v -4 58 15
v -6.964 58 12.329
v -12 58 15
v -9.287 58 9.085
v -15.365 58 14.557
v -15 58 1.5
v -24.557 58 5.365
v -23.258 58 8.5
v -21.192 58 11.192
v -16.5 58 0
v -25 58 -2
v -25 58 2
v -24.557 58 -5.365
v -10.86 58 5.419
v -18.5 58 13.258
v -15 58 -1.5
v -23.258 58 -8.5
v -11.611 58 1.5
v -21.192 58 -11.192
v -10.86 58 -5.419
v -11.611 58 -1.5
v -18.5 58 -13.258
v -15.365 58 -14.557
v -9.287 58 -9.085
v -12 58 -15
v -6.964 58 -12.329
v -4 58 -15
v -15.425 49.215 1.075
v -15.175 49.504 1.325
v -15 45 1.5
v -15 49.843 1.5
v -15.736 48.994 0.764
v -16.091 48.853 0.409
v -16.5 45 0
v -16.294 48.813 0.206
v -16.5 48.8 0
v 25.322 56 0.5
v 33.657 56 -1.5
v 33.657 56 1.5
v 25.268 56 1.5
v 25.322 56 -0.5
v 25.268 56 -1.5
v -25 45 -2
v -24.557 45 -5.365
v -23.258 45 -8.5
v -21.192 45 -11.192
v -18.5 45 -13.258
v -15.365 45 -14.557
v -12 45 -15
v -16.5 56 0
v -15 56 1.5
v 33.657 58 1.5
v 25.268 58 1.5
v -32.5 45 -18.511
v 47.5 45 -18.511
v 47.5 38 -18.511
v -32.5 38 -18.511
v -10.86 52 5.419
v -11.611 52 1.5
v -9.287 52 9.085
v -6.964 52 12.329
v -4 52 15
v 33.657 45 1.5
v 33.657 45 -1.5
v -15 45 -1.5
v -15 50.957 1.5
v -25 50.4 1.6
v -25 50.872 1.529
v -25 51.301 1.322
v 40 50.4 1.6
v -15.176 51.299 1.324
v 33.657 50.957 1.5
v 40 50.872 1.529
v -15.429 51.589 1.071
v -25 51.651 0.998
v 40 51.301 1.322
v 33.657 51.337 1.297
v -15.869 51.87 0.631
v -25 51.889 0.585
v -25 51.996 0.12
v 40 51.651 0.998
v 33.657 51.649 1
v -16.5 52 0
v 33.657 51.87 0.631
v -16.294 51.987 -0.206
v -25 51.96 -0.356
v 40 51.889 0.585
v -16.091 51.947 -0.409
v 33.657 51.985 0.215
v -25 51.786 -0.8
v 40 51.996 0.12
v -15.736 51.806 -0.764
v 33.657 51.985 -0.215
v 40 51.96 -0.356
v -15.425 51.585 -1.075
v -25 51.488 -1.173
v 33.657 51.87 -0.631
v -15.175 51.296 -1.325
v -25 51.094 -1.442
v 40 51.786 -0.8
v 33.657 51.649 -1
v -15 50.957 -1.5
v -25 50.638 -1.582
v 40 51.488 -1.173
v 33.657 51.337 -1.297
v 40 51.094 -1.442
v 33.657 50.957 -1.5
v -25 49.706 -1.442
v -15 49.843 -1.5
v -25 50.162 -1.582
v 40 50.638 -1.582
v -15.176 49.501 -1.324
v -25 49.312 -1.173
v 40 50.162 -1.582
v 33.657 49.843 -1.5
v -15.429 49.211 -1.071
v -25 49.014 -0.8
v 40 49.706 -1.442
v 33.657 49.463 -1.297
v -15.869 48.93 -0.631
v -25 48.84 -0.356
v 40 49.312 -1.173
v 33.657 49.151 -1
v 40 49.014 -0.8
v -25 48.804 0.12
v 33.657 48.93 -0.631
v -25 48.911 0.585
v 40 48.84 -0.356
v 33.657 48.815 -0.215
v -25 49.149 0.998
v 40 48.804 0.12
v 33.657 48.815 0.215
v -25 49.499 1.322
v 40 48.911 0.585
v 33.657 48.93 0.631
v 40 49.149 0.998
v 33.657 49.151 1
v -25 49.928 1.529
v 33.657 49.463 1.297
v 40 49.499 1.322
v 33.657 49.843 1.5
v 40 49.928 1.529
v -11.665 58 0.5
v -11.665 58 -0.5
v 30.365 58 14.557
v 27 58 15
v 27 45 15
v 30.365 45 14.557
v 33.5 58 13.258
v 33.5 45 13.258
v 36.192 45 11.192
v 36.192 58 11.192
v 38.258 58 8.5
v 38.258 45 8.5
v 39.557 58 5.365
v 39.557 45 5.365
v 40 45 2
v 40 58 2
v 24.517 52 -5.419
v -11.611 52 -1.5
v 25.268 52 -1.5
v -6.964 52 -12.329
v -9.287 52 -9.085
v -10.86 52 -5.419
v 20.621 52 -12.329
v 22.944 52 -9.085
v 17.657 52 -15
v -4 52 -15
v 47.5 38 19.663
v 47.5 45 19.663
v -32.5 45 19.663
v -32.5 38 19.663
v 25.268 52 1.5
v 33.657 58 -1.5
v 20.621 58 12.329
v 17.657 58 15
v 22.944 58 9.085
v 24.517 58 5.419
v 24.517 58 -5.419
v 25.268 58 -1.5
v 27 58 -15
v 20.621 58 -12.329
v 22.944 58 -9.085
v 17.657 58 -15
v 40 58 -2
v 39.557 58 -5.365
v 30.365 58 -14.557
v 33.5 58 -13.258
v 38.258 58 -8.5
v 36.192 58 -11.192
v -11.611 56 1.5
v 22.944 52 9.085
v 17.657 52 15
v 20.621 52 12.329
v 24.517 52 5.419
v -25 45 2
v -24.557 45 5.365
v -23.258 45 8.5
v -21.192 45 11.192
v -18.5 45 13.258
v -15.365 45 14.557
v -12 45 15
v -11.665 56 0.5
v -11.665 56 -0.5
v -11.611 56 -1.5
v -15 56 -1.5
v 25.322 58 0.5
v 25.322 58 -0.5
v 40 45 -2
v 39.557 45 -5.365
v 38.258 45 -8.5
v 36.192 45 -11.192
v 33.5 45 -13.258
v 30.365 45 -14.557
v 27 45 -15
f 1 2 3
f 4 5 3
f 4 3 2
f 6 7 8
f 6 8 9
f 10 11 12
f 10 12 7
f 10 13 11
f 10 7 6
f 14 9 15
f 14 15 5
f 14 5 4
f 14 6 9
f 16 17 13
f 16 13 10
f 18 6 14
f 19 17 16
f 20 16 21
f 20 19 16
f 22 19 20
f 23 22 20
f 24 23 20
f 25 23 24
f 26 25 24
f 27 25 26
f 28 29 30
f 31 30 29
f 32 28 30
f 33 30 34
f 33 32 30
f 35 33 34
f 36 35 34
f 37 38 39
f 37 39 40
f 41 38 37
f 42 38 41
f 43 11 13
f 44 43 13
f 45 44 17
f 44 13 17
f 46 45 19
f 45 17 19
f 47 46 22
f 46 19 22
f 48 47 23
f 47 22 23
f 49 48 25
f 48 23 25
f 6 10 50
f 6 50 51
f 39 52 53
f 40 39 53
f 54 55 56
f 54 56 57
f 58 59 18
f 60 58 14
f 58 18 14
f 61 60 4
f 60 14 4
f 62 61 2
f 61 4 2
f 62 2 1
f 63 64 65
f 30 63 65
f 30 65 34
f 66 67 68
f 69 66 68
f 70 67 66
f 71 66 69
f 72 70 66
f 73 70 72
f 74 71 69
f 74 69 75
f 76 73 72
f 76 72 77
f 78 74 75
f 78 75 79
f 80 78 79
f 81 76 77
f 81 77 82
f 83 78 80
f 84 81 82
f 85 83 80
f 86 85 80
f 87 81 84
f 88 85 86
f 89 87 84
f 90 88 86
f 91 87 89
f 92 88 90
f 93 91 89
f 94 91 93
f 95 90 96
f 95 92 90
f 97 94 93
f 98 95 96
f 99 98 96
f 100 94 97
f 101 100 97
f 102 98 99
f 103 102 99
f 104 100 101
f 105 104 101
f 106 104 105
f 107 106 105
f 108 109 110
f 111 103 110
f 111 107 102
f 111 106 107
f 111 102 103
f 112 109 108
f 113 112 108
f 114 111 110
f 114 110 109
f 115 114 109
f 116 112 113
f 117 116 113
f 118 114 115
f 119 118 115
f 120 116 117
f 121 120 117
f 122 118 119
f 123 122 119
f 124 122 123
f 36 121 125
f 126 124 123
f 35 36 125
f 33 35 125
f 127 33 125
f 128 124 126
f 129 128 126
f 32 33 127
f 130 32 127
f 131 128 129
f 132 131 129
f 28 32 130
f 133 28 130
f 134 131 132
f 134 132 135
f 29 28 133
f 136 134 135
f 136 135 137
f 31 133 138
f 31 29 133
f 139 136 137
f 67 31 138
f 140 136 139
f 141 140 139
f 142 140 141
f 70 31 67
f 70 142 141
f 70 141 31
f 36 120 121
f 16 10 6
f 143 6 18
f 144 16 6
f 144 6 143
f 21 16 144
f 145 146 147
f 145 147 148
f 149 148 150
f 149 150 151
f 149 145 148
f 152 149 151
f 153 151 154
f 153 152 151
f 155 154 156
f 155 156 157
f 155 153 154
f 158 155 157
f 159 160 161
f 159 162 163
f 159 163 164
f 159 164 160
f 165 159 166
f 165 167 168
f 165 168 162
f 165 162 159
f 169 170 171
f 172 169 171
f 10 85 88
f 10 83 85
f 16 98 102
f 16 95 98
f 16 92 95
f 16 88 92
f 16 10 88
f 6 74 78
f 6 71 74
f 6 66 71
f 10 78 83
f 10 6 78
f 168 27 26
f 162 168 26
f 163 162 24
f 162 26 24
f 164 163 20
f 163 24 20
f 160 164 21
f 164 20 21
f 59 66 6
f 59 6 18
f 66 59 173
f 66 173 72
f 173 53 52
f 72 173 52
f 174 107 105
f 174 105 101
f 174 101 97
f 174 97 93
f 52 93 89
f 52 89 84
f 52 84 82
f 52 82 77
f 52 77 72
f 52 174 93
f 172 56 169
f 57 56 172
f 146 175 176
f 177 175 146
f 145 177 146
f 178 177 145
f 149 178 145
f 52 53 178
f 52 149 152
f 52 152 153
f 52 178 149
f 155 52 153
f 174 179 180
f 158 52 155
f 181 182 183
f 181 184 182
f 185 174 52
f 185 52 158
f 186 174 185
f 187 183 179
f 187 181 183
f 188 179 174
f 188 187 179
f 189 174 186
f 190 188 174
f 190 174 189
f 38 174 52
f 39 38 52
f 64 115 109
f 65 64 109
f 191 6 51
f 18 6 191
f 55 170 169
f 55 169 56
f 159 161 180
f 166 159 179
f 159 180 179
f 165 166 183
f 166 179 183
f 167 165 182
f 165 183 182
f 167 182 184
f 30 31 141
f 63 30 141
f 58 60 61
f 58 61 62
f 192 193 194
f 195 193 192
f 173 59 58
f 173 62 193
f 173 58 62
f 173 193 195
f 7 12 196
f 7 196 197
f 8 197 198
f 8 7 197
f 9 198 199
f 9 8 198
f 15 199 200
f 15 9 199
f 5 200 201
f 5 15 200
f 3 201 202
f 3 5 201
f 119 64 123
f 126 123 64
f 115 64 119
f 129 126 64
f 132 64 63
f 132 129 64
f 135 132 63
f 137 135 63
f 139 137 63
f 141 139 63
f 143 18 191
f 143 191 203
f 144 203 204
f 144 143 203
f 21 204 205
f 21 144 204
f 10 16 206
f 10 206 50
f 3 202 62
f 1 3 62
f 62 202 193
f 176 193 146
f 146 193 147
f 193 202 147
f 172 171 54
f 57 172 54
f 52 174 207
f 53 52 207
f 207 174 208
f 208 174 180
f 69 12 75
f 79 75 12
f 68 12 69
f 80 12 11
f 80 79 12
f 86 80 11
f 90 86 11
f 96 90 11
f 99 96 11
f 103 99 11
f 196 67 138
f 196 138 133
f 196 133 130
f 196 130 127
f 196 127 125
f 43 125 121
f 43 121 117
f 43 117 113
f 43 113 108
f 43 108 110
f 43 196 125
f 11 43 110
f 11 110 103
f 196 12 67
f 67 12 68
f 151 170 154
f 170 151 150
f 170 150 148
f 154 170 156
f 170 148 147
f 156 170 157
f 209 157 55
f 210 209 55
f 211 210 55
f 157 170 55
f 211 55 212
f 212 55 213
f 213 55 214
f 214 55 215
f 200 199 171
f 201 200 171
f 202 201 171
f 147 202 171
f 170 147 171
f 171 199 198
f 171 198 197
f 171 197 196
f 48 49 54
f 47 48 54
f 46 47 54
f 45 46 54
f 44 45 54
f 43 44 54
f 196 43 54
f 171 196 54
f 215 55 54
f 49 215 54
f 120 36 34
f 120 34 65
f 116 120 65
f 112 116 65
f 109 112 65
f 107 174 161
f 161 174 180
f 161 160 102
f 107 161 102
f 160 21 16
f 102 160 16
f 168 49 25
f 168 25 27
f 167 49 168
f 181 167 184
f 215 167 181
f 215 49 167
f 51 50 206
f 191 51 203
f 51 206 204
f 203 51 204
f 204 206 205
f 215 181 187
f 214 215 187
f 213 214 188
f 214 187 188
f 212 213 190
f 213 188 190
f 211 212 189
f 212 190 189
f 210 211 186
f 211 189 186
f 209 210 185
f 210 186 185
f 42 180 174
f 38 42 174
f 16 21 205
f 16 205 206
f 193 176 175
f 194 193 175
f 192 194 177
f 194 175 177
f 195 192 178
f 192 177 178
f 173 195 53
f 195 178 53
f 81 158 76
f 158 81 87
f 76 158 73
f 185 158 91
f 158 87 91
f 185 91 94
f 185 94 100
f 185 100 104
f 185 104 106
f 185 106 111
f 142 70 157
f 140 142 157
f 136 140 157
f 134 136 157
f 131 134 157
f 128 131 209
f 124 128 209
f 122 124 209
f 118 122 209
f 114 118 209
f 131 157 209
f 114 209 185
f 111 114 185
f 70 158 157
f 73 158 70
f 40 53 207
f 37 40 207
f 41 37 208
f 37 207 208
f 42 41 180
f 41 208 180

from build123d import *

# Parameters (mm, degrees)
SKETCH1_W                = 65
SKETCH1_H                = 30
BOSS_EXTRUDE1_DEPTH      = 58
CUT_EXTRUDE1_DEPTH       = 70
CUT_EXTRUDE2_DEPTH       = 89.396832522
CUT_EXTRUDE2_DEPTH_BACK  = 89.396832522
SKETCH3_R                = 1.6
FILLET1_R                = 13
SKETCH15_W               = 83.696095513
SKETCH15_H               = 31.69844841
CUT_EXTRUDE7_DEPTH       = 50
BOSS_EXTRUDE4_DEPTH      = 2
BOSS_EXTRUDE4_DEPTH_BACK = 5
SKETCH16_W               = 80
SKETCH16_H               = 38.173794917
SKETCH18_R               = 18.5
CUT_EXTRUDE8_DEPTH       = 6
BOSS_EXTRUDE5_DEPTH      = 2
BOSS_EXTRUDE5_2_DEPTH    = 2


with BuildPart() as part:
    # Sketch1 → Boss-Extrude1 (new body)
    with BuildSketch(Plane(origin=(0, 0, 0), x_dir=(1, 0, 0), z_dir=(0, 1, 0))):
        with Locations((7.5, 0)):
            Rectangle(SKETCH1_W, SKETCH1_H)
    extrude(amount=BOSS_EXTRUDE1_DEPTH)

    # Sketch2 → Cut-Extrude1 (cut)
    with BuildSketch(Plane(origin=(0, 58, 0), x_dir=(1, 0, 0), z_dir=(0, 1, 0))):
        Polygon((-15, 1.5), (15, 1.5), (33.657016573, 1.5), (33.657016573, -1.5), (15, -1.5), (-15, -1.5), (-16.5, 0), align=None)
    extrude(amount=-CUT_EXTRUDE1_DEPTH, mode=Mode.SUBTRACT)

    # Sketch3 → Cut-Extrude2 (cut, two sides: drawn at the far end of the back side and taken through both)
    with BuildSketch(Plane.ZY.offset(25).offset(-CUT_EXTRUDE2_DEPTH_BACK)):
        with Locations((0, 50.4)):
            Circle(SKETCH3_R)
    extrude(amount=CUT_EXTRUDE2_DEPTH + CUT_EXTRUDE2_DEPTH_BACK, mode=Mode.SUBTRACT)

    # Fillet1
    fillet1_edges = [part.edges().sort_by_distance(p)[0] for p in [
        (40, 29, 15),
        (-25, 29, 15),
        (-25, 29, -15),
        (40, 29, -15),
    ]]
    fillet(fillet1_edges, radius=FILLET1_R)

    # Sketch15 → Cut-Extrude7 (cut)
    with BuildSketch(Plane(origin=(0, -10, 0), x_dir=(-1, 0, 0), z_dir=(0, -1, 0))):
        with Locations((-0.057440767, 0.030479277)):
            Rectangle(SKETCH15_W, SKETCH15_H)
    extrude(amount=-CUT_EXTRUDE7_DEPTH, mode=Mode.SUBTRACT)

    # Sketch16 → Boss-Extrude4 (add, two sides: drawn at the far end of the back side and taken through both)
    with BuildSketch(Plane(origin=(0, 40, 0), x_dir=(-1, 0, 0), z_dir=(0, -1, 0)).offset(-BOSS_EXTRUDE4_DEPTH_BACK)):
        with Locations((-7.5, -0.575928298)):
            Rectangle(SKETCH16_W, SKETCH16_H)
    extrude(amount=BOSS_EXTRUDE4_DEPTH + BOSS_EXTRUDE4_DEPTH_BACK)

    # Sketch18 → Cut-Extrude8 (cut)
    with BuildSketch(Plane(origin=(0, 58, 0), x_dir=(1, 0, 0), z_dir=(0, 1, 0))):
        with Locations((6.828508286, 0)):
            Circle(SKETCH18_R)
    extrude(amount=-CUT_EXTRUDE8_DEPTH, mode=Mode.SUBTRACT)


with BuildPart() as body_2:
    # Sketch19 → Boss-Extrude5 (new body)
    with BuildSketch(Plane(origin=(0, 58, 0), x_dir=(1, 0, 0), z_dir=(0, 1, 0))):
        with BuildLine():
            Line((-11.610580628, 1.5), (-15, 1.5))
            Line((-15, 1.5), (-16.5, 0))
            Line((-16.5, 0), (-15, -1.5))
            Line((-15, -1.5), (-11.610580628, -1.5))
            ThreePointArc((-11.610580628, -1.5), (-11.671491714, 0), (-11.610580628, 1.5))
        make_face()
    extrude(amount=-BOSS_EXTRUDE5_DEPTH)


with BuildPart() as body_3:
    # Sketch19 → Boss-Extrude5 2 (new body)
    with BuildSketch(Plane(origin=(0, 58, 0), x_dir=(1, 0, 0), z_dir=(0, 1, 0))):
        with BuildLine():
            Line((25.267597201, 1.5), (33.657016573, 1.5))
            Line((33.657016573, 1.5), (33.657016573, -1.5))
            Line((33.657016573, -1.5), (25.267597201, -1.5))
            ThreePointArc((25.267597201, -1.5), (25.328508286, 0), (25.267597201, 1.5))
        make_face()
    extrude(amount=-BOSS_EXTRUDE5_2_DEPTH)


solid = Compound([part.part, body_2.part, body_3.part])
